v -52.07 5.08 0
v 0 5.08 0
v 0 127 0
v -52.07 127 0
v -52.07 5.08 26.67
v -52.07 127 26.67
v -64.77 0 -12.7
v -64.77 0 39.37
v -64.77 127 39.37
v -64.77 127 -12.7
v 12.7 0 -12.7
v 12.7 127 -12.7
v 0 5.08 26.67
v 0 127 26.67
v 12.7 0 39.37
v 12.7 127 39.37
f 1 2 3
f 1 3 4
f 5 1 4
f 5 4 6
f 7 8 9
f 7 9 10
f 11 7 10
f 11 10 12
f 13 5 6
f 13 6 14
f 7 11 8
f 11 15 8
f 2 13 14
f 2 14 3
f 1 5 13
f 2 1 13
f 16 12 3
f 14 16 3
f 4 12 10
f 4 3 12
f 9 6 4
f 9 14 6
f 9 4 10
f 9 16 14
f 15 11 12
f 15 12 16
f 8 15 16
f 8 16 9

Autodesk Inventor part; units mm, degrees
ref_plane "YZ Plane" through (0, 0, 0) normal (1, 0, 0) x (0, 1, 0)
ref_plane "XZ Plane" through (0, 0, 0) normal (0, 1, 0) x (-1, 0, 0)
ref_plane "XY Plane" through (0, 0, 0) normal (0, 0, 1) x (1, 0, 0)
sketch "Sketch1" plane through (0, 0, 0) normal (0, 1, 0) x (-1, 0, 0)
  line L0 (0, 0) -> (52.07, 0)
  line L1 (52.07, 0) -> (52.07, 26.67)
  line L2 (52.07, 26.67) -> (0, 26.67)
  line L3 (0, 26.67) -> (0, 0)
  line L4 (-12.7, 39.37) -> (64.77, 39.37)
  line L5 (64.77, 39.37) -> (64.77, -12.7)
  line L6 (64.77, -12.7) -> (-12.7, -12.7)
  line L7 (-12.7, -12.7) -> (-12.7, 39.37)
  dimension "d0" = 26.67
  dimension "d1" = 52.07
  dimension "d2" = 12.7
  dimension "d3" = 12.7
  dimension "d4" = 12.7
  dimension "d5" = 12.7
extrude "Extrusion1" add sketch "Sketch1" along normal blind 127
sketch "Sketch2" plane through (0, 0, 0) normal (0, -1, 0) x (1, 0, 0)
  line L0 (0, 0) -> (-52.07, 0)
  line L1 (-52.07, 0) -> (-52.07, 26.67)
  line L2 (-52.07, 26.67) -> (0, 26.67)
  line L3 (0, 26.67) -> (0, 0)
extrude "Extrusion2" add sketch "Sketch2" against normal blind 5.08
properties part number "HammerStick Sleeve"
